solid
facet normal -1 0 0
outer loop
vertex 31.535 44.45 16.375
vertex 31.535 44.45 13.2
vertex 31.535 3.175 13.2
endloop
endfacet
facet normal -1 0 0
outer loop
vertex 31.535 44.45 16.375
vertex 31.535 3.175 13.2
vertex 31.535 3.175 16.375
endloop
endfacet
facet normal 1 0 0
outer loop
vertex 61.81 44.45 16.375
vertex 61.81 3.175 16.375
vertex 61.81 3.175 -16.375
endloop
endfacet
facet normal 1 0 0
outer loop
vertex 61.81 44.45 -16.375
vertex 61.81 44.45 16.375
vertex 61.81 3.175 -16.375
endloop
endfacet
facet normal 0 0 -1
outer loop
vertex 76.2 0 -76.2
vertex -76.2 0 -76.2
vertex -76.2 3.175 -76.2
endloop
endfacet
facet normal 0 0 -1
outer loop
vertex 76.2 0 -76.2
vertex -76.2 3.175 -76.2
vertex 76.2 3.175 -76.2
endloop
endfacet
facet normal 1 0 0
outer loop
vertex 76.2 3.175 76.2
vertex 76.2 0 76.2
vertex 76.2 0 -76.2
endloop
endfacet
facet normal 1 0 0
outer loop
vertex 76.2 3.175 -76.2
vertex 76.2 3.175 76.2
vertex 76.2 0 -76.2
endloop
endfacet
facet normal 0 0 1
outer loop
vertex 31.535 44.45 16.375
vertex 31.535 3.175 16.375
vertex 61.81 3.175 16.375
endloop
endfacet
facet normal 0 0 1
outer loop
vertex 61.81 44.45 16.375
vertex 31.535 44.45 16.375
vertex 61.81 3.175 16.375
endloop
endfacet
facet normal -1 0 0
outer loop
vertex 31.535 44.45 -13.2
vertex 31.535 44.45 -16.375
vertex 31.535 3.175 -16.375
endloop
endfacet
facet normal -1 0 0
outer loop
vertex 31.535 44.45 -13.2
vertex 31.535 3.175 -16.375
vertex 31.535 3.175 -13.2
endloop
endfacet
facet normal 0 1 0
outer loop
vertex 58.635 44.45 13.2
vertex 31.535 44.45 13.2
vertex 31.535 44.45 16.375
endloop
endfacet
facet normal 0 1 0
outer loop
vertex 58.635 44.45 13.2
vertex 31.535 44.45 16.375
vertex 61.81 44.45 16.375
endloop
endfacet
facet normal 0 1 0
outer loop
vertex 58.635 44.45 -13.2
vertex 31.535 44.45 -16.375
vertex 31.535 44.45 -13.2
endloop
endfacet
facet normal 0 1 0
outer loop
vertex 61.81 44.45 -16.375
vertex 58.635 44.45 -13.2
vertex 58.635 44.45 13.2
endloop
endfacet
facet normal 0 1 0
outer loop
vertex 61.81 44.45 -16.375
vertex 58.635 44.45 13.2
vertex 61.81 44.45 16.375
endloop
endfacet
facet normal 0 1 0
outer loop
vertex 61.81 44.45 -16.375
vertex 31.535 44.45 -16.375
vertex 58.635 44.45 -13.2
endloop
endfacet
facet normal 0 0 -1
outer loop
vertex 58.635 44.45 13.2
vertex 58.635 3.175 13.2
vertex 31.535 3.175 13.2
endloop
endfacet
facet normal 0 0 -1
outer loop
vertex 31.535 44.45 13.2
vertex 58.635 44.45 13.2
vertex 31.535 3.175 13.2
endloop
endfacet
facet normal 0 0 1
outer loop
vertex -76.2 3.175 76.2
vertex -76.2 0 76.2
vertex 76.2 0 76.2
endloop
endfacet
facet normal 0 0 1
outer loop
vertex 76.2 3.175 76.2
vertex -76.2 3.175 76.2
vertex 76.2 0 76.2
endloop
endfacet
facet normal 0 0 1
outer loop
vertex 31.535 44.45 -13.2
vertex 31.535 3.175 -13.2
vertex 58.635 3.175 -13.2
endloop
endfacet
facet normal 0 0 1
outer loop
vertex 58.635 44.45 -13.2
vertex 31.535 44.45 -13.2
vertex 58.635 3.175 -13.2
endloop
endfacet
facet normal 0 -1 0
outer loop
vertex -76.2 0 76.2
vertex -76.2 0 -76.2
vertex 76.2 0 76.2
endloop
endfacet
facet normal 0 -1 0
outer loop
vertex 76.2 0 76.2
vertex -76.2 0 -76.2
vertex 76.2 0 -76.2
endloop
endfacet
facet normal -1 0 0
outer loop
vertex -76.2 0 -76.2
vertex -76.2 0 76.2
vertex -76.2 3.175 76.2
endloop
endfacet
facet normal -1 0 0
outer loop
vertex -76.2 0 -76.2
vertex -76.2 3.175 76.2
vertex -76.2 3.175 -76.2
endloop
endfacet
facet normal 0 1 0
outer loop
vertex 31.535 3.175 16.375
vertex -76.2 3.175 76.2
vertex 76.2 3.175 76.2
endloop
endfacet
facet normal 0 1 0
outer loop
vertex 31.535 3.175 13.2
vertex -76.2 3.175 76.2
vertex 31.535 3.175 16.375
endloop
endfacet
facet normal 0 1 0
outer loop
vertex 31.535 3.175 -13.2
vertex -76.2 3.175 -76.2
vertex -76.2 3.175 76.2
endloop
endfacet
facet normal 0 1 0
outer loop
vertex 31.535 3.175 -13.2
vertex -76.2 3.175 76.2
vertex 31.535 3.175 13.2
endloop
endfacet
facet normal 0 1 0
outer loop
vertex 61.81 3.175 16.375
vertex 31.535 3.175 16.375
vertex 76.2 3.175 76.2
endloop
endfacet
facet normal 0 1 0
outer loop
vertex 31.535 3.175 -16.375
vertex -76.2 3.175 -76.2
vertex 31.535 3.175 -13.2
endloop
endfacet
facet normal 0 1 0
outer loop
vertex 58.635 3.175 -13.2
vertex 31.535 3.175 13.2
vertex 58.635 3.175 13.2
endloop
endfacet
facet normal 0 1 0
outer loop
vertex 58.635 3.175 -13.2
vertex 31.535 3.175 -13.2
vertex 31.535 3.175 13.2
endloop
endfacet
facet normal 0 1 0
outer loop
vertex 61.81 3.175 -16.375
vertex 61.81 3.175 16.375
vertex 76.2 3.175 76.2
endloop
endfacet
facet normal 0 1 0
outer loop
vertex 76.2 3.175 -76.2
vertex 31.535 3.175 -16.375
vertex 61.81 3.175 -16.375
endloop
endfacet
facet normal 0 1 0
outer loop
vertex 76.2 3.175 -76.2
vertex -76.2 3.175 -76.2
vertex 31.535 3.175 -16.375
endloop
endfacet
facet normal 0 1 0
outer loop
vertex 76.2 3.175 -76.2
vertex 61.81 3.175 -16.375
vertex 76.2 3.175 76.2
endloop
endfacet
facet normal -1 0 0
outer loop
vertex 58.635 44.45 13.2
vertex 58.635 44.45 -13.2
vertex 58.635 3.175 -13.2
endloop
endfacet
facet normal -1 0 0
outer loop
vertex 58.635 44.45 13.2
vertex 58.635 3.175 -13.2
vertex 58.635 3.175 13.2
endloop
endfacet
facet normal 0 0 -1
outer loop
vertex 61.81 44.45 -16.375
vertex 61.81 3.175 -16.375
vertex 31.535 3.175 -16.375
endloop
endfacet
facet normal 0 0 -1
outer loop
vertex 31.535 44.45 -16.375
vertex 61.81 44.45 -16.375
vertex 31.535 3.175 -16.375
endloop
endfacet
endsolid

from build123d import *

# Parameters (mm, degrees)
SKETCH1_W           = 152.4
SKETCH1_H           = 152.4
BOSS_EXTRUDE1_DEPTH = 3.175
BOSS_EXTRUDE2_DEPTH = 41.275


with BuildPart() as part:
    # Sketch1 → Boss-Extrude1 (new body)
    with BuildSketch(Plane(origin=(0, 0, 0), x_dir=(1, 0, 0), z_dir=(0, 1, 0))):
        Rectangle(SKETCH1_W, SKETCH1_H)
    extrude(amount=BOSS_EXTRUDE1_DEPTH)

    # Sketch2 → Boss-Extrude2 (add)
    with BuildSketch(Plane(origin=(0, 3.175, 0), x_dir=(1, 0, 0), z_dir=(0, 1, 0))):
        Polygon((58.635483549, 13.2), (58.635483549, -13.2), (31.535483549, -13.2), (31.535483549, -16.375), (61.810483549, -16.375), (61.810483549, 16.375), (31.535483549, 16.375), (31.535483549, 13.2), align=None)
    extrude(amount=BOSS_EXTRUDE2_DEPTH)


solid = part.part
